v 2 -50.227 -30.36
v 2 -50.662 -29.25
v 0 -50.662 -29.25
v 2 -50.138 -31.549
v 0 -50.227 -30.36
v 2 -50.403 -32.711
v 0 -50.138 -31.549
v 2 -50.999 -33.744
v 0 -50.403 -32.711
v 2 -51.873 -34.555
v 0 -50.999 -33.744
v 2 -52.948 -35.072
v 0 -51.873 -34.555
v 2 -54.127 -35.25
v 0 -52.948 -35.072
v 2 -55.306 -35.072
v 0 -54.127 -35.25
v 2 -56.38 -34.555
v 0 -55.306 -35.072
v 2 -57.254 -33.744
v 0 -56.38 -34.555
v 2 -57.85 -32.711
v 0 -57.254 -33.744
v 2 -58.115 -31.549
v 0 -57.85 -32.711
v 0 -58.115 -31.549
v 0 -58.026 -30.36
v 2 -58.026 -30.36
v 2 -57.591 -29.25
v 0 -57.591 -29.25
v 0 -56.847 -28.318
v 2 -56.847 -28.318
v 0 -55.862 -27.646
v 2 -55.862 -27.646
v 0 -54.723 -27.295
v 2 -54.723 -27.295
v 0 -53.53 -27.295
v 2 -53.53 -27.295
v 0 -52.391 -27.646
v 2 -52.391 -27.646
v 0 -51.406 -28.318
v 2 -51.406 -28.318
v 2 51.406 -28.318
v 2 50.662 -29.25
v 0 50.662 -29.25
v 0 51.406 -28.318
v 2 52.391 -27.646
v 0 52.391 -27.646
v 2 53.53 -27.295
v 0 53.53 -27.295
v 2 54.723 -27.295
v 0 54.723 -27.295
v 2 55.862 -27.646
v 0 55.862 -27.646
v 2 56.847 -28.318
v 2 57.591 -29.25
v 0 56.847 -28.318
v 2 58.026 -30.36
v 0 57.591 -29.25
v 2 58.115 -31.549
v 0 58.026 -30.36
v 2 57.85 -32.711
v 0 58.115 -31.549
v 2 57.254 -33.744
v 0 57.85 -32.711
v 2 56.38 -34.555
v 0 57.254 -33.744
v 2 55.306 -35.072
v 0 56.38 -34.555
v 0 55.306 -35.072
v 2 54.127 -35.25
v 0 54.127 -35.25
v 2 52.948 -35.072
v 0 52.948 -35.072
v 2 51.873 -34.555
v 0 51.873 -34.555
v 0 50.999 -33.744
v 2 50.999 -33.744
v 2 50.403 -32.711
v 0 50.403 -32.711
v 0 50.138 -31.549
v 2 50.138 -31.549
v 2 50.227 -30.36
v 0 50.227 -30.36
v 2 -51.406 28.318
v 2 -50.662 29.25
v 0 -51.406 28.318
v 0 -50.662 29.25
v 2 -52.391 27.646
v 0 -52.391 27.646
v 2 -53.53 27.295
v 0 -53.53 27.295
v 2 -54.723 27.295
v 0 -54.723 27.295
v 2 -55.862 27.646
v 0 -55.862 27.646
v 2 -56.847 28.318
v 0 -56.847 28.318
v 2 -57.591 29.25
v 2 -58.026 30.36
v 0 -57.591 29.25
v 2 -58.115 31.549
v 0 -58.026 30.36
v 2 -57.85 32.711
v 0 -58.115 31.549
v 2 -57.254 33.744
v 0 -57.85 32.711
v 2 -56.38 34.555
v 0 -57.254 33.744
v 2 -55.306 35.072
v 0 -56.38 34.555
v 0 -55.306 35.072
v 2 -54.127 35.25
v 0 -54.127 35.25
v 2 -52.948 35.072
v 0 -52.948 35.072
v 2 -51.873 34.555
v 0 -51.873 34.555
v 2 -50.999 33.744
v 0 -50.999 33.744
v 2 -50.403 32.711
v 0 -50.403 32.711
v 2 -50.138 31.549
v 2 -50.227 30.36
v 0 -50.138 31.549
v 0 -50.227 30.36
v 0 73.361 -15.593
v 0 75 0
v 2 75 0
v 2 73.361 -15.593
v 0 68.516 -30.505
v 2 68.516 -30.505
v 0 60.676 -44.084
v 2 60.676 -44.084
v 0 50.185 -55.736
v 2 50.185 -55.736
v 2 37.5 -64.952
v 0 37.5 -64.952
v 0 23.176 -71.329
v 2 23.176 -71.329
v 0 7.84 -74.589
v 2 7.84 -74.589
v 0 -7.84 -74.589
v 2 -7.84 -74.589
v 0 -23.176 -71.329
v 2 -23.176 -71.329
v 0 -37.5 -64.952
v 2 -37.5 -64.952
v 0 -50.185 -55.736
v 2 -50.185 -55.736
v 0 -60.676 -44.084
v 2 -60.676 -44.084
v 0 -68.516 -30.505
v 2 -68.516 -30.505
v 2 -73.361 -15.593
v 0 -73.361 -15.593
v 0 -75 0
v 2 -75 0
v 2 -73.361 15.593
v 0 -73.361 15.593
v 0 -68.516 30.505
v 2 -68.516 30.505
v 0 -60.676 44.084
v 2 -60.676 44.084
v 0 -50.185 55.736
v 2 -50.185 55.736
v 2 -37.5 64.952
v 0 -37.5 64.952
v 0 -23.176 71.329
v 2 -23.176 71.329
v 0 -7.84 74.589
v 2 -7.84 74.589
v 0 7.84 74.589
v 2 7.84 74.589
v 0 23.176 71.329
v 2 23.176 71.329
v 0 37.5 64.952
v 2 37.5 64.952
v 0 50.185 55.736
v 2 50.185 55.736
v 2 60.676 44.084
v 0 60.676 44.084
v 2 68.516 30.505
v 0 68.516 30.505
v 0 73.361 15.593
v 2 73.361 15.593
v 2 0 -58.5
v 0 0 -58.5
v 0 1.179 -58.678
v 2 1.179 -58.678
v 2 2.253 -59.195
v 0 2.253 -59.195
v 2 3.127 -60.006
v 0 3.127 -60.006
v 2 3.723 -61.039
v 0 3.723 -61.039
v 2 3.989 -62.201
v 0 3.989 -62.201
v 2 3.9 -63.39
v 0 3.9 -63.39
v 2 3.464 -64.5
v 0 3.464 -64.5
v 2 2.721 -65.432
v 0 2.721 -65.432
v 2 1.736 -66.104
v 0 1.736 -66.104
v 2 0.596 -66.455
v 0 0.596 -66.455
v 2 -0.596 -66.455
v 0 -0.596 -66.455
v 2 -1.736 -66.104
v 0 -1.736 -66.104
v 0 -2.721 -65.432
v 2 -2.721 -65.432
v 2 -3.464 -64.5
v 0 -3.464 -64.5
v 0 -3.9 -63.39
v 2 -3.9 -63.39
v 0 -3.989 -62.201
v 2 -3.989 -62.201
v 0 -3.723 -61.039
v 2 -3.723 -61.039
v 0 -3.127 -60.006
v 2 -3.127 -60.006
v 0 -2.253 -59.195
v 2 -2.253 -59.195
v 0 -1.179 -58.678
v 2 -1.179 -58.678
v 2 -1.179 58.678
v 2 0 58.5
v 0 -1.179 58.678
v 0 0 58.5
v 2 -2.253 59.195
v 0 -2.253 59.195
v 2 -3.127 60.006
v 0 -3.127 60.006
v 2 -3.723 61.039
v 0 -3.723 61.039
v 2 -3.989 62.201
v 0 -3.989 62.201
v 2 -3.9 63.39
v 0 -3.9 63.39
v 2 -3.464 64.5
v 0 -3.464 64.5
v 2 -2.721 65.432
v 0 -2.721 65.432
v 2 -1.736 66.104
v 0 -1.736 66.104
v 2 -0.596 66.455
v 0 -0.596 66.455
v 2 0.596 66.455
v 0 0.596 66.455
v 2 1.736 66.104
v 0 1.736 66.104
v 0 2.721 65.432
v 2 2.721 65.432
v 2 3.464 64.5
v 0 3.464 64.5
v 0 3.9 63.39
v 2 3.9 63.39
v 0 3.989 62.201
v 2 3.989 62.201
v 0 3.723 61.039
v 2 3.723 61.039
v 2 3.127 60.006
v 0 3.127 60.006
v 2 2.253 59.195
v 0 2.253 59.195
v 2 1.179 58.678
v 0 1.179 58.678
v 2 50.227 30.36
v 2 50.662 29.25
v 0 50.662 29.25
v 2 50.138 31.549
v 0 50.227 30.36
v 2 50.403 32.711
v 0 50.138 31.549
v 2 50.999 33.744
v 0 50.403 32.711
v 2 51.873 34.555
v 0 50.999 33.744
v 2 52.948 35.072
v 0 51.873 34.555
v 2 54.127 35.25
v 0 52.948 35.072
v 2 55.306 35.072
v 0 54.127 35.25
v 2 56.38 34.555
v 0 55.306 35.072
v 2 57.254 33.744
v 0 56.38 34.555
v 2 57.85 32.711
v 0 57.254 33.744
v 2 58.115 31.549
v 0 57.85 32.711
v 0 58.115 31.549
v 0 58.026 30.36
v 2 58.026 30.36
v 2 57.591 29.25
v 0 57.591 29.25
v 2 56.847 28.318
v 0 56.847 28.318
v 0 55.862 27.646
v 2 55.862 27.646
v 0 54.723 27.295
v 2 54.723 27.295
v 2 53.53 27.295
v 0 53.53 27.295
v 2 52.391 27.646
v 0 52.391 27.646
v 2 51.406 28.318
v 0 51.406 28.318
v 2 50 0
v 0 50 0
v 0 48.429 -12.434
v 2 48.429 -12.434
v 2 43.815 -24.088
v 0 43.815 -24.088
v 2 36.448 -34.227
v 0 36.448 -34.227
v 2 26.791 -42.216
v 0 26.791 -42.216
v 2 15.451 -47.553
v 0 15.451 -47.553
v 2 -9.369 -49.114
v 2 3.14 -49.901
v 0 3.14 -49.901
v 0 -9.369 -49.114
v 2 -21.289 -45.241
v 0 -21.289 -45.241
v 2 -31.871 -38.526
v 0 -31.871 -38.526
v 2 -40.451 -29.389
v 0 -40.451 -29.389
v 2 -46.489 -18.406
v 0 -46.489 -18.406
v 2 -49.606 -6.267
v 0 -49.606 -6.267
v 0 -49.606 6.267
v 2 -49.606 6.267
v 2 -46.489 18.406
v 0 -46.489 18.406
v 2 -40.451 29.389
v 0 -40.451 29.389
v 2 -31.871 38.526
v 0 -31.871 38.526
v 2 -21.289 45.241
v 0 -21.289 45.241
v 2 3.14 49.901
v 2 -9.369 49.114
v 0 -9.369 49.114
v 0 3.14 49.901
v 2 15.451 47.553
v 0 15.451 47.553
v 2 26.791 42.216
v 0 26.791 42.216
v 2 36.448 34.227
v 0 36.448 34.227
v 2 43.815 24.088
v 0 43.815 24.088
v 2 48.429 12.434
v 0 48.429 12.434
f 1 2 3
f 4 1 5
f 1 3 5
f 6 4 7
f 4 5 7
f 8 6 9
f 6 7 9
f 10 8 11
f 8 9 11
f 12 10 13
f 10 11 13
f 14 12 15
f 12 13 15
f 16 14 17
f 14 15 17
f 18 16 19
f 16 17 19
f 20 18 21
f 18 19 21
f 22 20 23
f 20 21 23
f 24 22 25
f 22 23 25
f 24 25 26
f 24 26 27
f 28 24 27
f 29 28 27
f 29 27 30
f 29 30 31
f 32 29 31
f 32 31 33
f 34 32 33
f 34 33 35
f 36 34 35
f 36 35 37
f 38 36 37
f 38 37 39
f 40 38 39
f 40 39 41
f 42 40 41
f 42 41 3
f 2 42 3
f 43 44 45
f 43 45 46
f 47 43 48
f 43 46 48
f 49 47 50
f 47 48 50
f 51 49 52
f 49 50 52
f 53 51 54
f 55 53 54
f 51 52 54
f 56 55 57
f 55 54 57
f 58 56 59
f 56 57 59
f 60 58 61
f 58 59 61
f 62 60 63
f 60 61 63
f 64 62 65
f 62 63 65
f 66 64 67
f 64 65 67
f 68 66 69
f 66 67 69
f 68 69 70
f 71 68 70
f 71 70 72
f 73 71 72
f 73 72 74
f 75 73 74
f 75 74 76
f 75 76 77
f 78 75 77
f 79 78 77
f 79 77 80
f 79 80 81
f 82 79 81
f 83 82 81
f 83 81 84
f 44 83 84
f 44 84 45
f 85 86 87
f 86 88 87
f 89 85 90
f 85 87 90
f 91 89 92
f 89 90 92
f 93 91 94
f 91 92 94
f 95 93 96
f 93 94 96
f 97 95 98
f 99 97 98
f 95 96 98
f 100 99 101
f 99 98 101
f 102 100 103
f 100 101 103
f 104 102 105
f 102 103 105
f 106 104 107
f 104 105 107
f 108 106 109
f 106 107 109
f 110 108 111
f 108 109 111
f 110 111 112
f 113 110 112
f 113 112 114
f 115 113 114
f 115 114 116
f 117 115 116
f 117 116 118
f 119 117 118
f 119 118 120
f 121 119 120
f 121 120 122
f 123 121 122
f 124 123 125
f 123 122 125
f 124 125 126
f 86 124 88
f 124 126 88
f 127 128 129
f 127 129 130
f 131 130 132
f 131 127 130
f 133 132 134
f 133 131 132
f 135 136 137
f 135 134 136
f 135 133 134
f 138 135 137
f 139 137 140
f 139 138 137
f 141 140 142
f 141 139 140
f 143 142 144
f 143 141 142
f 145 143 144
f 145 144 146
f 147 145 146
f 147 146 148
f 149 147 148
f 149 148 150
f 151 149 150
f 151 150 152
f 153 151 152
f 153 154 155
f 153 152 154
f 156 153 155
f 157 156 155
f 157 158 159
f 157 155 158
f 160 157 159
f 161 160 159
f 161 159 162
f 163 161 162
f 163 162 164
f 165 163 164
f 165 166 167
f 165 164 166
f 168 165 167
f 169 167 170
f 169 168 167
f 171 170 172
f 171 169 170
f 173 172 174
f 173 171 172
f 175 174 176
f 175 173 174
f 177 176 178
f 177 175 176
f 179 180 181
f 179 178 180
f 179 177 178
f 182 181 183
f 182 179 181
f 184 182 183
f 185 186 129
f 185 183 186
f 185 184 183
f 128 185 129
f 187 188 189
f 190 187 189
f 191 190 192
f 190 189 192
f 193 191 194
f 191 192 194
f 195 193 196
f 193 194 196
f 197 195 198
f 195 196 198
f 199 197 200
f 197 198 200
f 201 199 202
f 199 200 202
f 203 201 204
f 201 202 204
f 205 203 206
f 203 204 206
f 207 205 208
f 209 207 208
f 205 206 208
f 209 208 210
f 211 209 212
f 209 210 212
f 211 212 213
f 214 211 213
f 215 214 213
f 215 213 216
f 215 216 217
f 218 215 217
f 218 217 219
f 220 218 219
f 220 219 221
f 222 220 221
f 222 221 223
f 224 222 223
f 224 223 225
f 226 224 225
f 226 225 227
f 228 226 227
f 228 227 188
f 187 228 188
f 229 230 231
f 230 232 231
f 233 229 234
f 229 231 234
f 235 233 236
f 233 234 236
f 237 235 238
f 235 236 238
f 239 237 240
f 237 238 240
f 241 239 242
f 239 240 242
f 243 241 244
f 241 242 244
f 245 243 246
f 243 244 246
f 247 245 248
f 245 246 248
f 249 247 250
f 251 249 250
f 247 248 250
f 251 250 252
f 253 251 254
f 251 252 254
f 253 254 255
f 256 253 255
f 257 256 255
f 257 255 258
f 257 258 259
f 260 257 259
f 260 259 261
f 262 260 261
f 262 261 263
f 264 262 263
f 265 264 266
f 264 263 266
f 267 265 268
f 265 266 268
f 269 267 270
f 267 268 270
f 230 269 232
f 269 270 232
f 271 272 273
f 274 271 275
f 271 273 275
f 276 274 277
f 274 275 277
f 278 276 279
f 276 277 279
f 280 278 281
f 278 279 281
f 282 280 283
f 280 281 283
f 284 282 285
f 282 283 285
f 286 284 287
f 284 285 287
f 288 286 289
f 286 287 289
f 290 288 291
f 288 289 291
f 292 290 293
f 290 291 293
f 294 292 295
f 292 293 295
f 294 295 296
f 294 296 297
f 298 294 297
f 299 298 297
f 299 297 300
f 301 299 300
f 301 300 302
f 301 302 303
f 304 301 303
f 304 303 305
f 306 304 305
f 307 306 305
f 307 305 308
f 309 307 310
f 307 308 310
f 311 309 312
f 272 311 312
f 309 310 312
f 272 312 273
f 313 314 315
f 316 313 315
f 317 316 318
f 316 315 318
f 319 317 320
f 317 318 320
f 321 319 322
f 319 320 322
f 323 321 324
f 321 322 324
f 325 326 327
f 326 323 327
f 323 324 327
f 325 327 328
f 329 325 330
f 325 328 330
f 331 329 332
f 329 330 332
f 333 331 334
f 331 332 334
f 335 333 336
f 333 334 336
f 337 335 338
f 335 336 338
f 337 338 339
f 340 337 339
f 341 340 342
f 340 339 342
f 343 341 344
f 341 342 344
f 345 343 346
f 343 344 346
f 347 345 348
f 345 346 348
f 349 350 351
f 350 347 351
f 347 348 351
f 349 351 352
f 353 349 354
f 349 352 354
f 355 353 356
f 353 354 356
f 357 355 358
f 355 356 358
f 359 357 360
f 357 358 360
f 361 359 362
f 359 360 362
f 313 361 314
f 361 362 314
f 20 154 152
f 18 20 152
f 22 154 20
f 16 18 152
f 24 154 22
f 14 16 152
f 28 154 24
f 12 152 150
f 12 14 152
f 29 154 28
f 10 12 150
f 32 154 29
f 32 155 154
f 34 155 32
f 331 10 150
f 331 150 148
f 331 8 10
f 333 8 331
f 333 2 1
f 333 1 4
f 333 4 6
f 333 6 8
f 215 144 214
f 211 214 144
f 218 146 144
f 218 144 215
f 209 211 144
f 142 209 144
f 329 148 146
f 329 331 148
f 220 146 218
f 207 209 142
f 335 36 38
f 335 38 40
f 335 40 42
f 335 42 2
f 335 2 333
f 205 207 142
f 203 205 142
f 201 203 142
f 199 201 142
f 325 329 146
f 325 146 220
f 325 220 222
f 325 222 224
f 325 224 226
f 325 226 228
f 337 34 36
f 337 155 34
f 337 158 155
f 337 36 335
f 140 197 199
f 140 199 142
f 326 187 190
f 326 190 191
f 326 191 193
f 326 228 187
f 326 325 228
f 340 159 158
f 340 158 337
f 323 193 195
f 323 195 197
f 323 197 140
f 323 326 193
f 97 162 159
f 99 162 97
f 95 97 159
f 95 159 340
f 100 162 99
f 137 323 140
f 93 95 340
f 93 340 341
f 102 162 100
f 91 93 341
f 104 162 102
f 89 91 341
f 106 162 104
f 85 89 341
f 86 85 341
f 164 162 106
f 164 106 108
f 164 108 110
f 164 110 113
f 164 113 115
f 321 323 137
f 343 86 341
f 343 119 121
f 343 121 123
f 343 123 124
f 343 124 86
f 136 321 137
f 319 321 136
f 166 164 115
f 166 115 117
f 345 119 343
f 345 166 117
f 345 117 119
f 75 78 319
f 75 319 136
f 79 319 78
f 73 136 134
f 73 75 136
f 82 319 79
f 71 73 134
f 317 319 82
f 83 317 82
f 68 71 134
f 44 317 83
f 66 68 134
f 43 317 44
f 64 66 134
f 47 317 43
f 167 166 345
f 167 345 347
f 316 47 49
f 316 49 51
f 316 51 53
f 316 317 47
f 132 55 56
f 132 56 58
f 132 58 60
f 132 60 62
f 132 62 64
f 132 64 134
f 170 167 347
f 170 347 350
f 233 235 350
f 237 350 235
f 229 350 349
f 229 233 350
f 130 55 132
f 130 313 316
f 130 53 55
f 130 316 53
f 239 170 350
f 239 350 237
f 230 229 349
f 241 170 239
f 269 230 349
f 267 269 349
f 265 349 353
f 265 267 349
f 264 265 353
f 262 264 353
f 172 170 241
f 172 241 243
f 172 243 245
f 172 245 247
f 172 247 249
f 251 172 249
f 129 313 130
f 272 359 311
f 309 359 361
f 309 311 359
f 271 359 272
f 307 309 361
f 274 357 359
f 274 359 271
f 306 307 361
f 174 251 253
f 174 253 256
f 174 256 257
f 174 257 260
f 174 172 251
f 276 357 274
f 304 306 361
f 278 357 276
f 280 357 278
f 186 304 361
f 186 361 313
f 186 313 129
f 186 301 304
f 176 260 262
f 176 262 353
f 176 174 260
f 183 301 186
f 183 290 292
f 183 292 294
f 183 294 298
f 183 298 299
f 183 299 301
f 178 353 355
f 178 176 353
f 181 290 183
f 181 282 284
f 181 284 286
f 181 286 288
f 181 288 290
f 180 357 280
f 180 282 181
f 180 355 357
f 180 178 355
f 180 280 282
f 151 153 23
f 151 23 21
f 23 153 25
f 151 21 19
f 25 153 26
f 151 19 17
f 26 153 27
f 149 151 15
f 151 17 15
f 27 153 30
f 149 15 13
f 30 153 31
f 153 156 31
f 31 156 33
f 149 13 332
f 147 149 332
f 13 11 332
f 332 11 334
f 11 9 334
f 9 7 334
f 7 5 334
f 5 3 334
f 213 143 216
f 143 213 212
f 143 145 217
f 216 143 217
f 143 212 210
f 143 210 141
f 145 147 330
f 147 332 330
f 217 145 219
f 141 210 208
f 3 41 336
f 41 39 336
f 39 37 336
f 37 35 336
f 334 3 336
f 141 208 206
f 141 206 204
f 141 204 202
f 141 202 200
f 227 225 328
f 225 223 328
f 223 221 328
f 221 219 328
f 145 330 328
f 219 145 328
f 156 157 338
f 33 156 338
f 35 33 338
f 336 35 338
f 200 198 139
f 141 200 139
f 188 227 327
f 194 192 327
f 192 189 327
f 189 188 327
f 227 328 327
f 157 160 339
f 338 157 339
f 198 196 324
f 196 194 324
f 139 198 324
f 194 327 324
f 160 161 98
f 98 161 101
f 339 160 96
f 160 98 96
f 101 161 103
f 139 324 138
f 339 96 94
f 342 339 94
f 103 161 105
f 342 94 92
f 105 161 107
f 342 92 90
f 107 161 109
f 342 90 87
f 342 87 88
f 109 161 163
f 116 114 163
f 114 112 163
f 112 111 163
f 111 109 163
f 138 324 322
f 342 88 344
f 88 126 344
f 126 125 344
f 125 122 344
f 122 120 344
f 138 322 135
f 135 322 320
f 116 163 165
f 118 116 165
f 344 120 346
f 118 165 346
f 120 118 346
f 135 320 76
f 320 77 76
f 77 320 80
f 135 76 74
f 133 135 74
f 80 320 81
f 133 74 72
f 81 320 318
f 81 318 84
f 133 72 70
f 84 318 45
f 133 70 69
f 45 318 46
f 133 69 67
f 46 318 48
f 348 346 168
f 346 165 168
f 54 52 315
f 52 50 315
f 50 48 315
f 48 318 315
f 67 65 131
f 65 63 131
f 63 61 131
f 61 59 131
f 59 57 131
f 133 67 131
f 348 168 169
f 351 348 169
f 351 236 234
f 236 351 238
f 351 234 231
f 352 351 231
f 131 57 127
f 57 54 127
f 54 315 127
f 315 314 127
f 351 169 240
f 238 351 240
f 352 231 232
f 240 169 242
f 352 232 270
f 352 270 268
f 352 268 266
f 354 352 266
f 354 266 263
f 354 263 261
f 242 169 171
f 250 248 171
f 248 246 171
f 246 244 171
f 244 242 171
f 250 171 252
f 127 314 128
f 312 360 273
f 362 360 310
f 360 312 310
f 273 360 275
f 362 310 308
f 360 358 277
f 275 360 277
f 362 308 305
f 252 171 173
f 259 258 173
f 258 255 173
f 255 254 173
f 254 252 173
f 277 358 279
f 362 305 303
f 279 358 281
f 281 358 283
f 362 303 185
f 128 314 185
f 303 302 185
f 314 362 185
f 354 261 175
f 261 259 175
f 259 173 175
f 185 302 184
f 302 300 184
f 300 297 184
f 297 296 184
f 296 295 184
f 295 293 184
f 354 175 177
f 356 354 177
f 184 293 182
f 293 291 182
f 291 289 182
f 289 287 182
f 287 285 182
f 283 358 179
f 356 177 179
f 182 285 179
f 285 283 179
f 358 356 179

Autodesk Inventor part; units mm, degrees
ref_plane "YZ Plane" through (0, 0, 0) normal (1, 0, 0) x (0, 1, 0)
ref_plane "XZ Plane" through (0, 0, 0) normal (0, 1, 0) x (-1, 0, 0)
ref_plane "XY Plane" through (0, 0, 0) normal (0, 0, 1) x (1, 0, 0)
sketch "Sketch1" plane through (0, 0, 0) normal (1, 0, 0) x (0, 1, 0)
  circle A0 centre (0, 0) radius 75
  circle A1 centre (0, 0) radius 50
  dimension "d0" = 150
  dimension "d1" = 100
extrude "Extrusion1" add sketch "Sketch1" along normal blind 2
sketch "Sketch2" plane through (0, 0, 0) normal (-1, 0, 0) x (0, 0, 1)
  circle A0 centre (0, 0) radius 75 projected
  line L0 (-75, 0) -> (-50, 0)
  circle A1 centre (0, 0) radius 50 projected
  circle A2 centre (-62.5, 0) radius 4
  dimension "d4" = 8
extrude "Extrusion2" cut sketch "Sketch2" against normal blind 2 contours A2 L0 | L0 A2
pattern_circular "Circular Pattern1" count 6 over 360 about axis through (0, 0, 0) along (1, 0, 0) of "Extrusion2"
properties part number "11_Dem_cua_tham"
